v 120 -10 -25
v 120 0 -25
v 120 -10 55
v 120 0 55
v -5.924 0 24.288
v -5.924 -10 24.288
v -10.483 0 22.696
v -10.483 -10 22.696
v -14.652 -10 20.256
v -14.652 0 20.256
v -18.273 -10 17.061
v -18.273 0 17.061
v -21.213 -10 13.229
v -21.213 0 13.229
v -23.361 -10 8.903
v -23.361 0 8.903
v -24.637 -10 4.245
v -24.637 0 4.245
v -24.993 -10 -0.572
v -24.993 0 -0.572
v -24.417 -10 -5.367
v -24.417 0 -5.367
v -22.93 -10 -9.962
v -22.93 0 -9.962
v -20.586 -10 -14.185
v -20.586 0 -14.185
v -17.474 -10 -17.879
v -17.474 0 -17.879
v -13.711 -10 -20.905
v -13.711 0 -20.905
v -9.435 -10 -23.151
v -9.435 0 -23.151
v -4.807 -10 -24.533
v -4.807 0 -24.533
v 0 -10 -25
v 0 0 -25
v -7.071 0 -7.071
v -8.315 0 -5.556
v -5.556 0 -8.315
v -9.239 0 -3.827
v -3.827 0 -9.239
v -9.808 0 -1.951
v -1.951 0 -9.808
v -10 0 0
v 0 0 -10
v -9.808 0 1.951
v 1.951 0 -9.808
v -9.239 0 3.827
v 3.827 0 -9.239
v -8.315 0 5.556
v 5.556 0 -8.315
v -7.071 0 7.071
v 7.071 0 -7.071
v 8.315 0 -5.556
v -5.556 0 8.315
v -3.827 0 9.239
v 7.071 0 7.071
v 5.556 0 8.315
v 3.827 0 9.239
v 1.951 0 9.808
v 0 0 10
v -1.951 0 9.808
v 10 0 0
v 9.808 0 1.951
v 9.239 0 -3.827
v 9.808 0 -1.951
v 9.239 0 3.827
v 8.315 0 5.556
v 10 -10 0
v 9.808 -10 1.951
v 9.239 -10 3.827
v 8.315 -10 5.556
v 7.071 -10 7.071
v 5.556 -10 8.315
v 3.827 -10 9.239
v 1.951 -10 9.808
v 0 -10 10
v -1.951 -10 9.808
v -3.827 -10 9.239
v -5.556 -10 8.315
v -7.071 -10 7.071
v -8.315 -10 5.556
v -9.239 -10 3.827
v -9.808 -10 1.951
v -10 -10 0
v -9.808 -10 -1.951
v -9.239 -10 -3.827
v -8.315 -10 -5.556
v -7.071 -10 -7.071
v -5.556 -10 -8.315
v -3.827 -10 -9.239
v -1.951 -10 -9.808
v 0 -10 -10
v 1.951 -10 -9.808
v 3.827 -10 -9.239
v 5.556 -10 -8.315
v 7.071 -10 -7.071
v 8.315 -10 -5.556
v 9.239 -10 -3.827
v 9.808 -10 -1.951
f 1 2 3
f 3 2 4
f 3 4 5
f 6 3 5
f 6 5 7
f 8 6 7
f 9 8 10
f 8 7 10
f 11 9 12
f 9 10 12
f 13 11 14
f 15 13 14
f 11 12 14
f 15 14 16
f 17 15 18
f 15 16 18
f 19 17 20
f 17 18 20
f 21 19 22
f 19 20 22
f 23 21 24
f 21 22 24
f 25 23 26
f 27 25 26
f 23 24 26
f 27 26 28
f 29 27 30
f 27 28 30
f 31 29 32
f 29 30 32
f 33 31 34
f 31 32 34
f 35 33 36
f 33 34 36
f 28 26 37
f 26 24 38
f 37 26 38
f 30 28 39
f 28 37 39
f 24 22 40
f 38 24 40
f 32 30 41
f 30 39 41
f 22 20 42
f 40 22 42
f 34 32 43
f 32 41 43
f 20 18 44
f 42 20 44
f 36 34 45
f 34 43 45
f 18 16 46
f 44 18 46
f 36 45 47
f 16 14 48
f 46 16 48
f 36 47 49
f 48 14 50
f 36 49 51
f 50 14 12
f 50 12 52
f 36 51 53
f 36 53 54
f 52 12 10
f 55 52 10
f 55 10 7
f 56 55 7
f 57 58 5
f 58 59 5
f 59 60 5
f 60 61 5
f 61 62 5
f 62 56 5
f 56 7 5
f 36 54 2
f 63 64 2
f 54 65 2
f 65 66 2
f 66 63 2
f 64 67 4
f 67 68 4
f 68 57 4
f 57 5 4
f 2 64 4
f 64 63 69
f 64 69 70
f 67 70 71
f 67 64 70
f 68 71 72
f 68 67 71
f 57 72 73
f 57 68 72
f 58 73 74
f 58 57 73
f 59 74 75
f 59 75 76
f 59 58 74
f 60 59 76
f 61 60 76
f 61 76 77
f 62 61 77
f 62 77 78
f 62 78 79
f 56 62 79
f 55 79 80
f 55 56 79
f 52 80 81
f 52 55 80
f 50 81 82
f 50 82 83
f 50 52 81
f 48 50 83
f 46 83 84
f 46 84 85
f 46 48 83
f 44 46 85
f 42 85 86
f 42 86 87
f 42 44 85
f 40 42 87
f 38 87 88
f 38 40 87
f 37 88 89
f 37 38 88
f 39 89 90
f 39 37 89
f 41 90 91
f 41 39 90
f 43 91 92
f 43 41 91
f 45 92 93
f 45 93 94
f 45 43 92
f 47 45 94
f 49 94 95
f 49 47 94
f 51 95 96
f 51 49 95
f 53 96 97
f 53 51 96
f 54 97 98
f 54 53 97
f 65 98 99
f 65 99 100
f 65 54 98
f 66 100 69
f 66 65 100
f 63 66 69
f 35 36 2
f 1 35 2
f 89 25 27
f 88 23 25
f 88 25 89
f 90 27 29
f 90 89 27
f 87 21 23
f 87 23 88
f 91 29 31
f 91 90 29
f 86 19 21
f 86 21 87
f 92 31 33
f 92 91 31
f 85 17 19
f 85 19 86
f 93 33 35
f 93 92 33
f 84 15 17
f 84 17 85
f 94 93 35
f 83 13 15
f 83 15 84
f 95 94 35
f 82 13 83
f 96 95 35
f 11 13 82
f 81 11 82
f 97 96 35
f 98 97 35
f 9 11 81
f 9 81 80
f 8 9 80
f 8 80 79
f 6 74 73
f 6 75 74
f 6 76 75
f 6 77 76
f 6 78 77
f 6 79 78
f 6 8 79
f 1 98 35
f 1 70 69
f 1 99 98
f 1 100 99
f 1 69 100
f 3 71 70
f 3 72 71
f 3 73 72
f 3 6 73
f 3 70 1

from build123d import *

# Parameters (mm, degrees)
F0_R     = 10
F1_DEPTH = 10


with BuildPart() as f1:
    # F0 (on Front) → F1 (new body)
    with BuildSketch(Plane.XZ):
        with BuildLine():
            ThreePointArc((-5.923694, 24.28806), (-24.821377, -2.983162), (0, -25))
            Line((0, -25), (120, -25))
            Line((120, -25), (120, 55))
            Line((120, 55), (-5.923694, 24.28806))
        make_face()
        Circle(F0_R, mode=Mode.SUBTRACT)
    extrude(amount=F1_DEPTH)


solid = f1.part
